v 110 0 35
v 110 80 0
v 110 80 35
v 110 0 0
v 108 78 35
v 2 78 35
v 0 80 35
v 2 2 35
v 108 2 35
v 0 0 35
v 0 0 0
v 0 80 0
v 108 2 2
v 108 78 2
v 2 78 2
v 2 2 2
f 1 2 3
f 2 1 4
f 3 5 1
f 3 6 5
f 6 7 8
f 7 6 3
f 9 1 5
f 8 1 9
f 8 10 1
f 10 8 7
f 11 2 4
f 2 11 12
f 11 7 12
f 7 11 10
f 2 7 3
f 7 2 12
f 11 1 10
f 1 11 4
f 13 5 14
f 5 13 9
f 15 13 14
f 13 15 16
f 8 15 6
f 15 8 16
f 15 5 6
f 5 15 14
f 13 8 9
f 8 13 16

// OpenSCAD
L = 110;
W = 80;
H = 35;
wall = 2;
floor_t = 2;
difference() {
  cube([L,W,H]);
  translate([wall,wall,floor_t]) cube([L-2*wall,W-2*wall,H]);
}
